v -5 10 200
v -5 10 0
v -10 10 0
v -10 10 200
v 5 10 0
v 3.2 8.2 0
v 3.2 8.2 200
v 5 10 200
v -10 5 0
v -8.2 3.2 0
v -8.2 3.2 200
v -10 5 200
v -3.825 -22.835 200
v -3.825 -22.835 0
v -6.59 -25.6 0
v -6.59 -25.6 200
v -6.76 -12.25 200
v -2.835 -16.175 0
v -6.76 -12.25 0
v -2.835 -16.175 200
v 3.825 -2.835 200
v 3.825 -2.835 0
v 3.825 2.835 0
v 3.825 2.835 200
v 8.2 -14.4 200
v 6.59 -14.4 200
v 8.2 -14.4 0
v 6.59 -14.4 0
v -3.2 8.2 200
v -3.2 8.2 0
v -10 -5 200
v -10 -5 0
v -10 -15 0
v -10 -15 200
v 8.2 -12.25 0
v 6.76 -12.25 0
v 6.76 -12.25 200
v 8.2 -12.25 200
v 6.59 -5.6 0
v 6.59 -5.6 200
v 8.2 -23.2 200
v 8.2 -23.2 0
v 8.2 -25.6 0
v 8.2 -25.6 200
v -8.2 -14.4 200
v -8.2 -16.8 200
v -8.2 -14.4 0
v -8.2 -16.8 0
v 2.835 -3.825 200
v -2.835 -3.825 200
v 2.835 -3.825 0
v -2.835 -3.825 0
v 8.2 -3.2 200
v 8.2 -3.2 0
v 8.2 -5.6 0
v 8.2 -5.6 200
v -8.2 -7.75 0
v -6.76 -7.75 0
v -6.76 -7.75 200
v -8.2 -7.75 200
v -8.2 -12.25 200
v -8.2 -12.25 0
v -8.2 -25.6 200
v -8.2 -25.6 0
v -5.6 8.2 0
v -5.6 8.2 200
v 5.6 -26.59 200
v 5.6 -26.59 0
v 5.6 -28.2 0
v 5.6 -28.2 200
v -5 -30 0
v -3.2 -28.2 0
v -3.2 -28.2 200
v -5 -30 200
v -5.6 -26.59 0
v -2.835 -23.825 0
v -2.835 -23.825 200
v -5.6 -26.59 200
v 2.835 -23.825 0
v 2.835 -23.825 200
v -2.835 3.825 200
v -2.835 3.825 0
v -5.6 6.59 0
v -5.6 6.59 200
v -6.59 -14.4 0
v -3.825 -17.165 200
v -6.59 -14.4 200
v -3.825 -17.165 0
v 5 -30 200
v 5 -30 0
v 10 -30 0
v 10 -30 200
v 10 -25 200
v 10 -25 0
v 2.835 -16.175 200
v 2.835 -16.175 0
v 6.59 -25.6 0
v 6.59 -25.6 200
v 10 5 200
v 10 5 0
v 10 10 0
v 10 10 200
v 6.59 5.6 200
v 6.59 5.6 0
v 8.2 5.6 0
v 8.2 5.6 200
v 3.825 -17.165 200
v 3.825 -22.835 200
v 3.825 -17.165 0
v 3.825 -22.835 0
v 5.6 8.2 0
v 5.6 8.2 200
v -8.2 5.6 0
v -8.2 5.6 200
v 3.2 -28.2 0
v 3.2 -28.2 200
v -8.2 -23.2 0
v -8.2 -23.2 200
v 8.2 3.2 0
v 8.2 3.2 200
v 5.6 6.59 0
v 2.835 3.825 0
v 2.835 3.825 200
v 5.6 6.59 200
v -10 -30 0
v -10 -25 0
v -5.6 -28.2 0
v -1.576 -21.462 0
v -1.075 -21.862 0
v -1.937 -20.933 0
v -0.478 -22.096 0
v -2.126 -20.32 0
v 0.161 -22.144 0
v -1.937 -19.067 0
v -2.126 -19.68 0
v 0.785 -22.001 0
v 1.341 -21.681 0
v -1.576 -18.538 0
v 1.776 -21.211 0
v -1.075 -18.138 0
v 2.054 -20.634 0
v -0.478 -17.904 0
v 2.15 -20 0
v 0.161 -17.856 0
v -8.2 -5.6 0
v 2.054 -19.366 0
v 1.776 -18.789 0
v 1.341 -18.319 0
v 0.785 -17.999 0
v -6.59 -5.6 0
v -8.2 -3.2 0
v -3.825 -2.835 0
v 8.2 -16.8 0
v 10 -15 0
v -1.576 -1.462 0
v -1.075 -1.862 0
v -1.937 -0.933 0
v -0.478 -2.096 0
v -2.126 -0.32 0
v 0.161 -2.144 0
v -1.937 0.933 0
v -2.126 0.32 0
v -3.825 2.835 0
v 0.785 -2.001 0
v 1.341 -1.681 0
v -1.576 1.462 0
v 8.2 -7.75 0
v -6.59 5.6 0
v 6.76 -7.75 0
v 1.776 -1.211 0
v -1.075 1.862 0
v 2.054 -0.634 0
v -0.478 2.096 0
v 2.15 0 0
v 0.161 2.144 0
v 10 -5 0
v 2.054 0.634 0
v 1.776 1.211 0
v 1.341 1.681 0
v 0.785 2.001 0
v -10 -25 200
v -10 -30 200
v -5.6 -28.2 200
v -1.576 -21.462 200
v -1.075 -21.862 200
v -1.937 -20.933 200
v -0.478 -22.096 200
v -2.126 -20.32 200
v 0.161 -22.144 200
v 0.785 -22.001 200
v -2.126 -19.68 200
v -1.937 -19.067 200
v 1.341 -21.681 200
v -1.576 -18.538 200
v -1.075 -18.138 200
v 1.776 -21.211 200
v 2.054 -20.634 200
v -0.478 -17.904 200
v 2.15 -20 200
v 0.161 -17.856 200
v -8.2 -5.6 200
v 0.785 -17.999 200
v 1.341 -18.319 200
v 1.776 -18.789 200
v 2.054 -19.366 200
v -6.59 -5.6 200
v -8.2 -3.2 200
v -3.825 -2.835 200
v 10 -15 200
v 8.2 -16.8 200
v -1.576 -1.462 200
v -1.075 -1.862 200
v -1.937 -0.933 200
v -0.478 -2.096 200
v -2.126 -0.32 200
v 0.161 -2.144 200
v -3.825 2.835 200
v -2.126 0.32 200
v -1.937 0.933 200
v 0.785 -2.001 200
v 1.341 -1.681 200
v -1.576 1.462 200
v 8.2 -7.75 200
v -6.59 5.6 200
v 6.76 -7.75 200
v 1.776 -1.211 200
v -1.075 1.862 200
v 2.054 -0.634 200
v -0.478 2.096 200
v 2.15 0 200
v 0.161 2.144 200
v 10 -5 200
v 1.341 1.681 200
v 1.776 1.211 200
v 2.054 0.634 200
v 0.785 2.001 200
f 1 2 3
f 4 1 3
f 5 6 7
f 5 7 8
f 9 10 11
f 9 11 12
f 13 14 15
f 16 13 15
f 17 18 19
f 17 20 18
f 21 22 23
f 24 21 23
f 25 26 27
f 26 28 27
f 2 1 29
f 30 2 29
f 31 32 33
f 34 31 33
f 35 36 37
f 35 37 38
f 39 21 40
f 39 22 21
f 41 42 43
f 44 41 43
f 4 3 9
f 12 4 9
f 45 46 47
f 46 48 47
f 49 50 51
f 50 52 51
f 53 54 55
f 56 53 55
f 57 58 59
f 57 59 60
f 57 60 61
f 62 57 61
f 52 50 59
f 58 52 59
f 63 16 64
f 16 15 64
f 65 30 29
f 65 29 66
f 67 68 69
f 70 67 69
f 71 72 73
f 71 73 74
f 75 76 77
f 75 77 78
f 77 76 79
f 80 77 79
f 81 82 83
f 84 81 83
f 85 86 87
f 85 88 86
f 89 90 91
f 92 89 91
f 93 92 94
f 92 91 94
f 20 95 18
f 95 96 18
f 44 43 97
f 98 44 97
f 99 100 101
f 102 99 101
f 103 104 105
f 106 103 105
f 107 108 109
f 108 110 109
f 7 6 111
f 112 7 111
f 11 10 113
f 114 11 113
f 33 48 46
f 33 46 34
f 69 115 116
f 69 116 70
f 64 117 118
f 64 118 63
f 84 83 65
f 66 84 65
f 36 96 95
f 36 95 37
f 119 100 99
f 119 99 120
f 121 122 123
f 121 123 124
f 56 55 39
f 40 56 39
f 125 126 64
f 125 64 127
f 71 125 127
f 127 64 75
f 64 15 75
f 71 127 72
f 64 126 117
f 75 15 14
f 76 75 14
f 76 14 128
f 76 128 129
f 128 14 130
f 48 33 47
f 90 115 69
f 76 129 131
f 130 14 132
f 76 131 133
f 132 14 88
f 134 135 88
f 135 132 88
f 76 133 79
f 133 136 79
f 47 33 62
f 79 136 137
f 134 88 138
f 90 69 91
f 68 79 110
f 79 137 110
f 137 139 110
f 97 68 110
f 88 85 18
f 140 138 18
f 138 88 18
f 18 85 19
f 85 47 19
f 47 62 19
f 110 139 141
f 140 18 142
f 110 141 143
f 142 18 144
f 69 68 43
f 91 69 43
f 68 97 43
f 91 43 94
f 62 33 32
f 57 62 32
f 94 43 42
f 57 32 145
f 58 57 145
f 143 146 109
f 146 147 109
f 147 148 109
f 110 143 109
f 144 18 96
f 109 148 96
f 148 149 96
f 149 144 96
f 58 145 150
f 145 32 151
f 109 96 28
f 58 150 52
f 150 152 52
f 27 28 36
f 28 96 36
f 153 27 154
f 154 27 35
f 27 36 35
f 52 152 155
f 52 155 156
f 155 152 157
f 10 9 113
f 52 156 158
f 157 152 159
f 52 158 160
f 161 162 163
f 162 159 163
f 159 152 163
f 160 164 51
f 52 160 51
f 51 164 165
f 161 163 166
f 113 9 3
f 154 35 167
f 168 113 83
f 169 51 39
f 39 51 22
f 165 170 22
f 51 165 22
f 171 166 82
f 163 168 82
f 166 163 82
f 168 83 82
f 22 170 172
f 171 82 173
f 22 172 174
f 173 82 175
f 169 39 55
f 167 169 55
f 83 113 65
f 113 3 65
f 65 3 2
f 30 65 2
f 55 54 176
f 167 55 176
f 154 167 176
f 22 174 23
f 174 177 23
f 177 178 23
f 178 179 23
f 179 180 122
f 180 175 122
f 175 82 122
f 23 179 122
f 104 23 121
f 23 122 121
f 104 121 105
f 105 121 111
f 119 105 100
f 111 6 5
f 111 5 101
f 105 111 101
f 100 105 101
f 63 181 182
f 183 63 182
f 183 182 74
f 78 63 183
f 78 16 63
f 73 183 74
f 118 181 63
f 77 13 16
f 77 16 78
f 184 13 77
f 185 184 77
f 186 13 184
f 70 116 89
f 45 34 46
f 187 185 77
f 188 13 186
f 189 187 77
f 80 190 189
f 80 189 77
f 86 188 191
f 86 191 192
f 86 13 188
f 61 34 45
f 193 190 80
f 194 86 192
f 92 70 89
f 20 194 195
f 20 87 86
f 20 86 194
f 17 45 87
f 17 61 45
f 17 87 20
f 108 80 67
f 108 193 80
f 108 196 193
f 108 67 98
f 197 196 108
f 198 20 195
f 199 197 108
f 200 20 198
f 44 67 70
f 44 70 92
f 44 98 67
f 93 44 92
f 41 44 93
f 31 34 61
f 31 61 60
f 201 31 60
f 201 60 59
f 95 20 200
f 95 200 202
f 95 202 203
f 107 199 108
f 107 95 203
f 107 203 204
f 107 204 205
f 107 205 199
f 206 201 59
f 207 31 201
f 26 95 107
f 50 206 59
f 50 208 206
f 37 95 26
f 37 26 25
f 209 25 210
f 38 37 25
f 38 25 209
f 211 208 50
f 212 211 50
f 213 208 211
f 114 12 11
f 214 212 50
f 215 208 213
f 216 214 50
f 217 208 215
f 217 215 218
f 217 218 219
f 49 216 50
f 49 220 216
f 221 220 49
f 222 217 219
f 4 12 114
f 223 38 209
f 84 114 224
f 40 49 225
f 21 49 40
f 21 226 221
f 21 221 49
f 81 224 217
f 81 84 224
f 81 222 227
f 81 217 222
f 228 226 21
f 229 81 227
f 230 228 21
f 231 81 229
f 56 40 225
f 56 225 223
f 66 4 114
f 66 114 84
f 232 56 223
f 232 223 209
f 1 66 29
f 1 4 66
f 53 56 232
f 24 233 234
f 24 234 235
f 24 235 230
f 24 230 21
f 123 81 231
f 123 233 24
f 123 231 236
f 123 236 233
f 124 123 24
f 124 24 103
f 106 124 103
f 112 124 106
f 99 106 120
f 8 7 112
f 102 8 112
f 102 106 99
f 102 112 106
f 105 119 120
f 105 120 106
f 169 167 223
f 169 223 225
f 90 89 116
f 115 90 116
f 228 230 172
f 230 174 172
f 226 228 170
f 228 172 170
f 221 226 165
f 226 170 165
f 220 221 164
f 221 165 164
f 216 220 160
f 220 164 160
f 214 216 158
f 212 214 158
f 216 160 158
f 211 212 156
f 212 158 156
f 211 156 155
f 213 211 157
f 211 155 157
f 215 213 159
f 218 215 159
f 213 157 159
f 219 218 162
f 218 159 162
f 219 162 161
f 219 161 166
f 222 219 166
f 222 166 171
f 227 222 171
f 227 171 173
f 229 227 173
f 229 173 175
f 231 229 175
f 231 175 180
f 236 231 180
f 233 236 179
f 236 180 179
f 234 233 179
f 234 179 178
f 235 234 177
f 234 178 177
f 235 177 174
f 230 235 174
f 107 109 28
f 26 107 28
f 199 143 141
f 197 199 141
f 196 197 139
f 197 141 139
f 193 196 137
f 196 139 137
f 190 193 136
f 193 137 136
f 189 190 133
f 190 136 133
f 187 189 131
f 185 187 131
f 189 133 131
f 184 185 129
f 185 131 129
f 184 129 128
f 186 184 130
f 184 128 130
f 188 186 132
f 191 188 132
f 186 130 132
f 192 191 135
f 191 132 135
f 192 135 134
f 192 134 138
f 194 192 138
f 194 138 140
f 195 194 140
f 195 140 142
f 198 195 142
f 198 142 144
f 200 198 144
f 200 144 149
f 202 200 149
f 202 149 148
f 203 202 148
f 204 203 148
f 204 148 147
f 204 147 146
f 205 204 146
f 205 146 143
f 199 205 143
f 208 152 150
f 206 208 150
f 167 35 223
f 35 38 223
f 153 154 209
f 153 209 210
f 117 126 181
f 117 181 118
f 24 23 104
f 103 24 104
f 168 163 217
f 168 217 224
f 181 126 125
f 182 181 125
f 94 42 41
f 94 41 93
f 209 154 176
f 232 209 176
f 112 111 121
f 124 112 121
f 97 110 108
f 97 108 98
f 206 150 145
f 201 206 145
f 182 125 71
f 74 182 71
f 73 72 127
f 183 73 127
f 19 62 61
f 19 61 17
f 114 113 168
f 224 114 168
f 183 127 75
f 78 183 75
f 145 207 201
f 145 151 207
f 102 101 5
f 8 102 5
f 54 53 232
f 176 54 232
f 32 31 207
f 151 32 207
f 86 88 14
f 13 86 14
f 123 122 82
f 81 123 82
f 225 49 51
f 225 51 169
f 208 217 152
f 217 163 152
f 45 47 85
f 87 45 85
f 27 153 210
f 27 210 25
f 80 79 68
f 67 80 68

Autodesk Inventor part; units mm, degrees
ref_plane "YZ Plane" through (0, 0, 0) normal (1, 0, 0) x (0, 1, 0)
ref_plane "XZ Plane" through (0, 0, 0) normal (0, 1, 0) x (-1, 0, 0)
ref_plane "XY Plane" through (0, 0, 0) normal (0, 0, 1) x (1, 0, 0)
sketch "Sketch1" plane through (0, 0, 0) normal (0, 0, 1) x (1, 0, 0)
  line L0 (-10, -10) -> (-5.6, -10)
  line L1 (-10, -5.6) -> (-10, -10)
  line L2 (-5.6, -10) -> (-5, -10)
  line L3 (-3.2, -8.2) -> (-5.6, -8.2)
  line L4 (-2.8351, -3.825) -> (-5.6, -6.5899)
  line L5 (-3.825, -2.8351) -> (-6.5899, -5.6)
  line L6 (0, 0) -> (0, -11) construction
  line L7 (0, 0) -> (-12, 0) construction
  line L8 (-3.2, -8.2) -> (-5, -10)
  line L9 (-6.5899, -5.6) -> (-8.2, -5.6)
  line L10 (-10, -5.6) -> (-10, -5)
  line L11 (-10, -5) -> (-8.2, -3.2)
  line L12 (-8.2, -3.2) -> (-8.2, -5.6)
  line L13 (-5.6, -8.2) -> (-5.6, -6.5899)
  arc A0 (-2.15, 0) -> (0, -2.15) centre (0, 0) ccw
  line L14 (0, 0) -> (-3.825, 0)
  line L15 (-3.825, 0) -> (-3.825, -2.8351)
  line L16 (-2.8351, -3.825) -> (0, -3.825)
  line L17 (0, -3.825) -> (0, 0)
  line L18 (-2.8351, -3.825) -> (-3.825, -3.825) construction
  line L19 (-3.825, -3.825) -> (-3.825, -2.8351) construction
  line L20 (3.825, -2.8351) -> (3.825, -3.825) construction
  line L21 (3.825, -2.8351) -> (3.825, 0)
  line L22 (3.825, -3.825) -> (2.8351, -3.825) construction
  line L23 (3.825, 0) -> (0, 0)
  line L24 (0, -3.825) -> (2.8351, -3.825)
  arc A1 (0, -2.15) -> (2.15, 0) centre (0, 0) ccw
  line L25 (0, 0) -> (0, -3.825)
  line L26 (2.8351, -3.825) -> (5.6, -6.5899)
  line L27 (0, 0) -> (0, -12) construction
  line L28 (0, 0) -> (11, 0) construction
  line L29 (3.825, -2.8351) -> (6.5899, -5.6)
  line L30 (8.2, -3.2) -> (8.2, -5.6)
  line L31 (10, -5.6) -> (10, -5)
  line L32 (8.2, -3.2) -> (10, -5)
  line L33 (8.2, -5.6) -> (6.5899, -5.6)
  line L34 (5.6, -6.5899) -> (5.6, -8.2)
  line L35 (10, -10) -> (10, -5.6)
  line L36 (5.6, -10) -> (10, -10)
  line L37 (3.2, -8.2) -> (5.6, -8.2)
  line L38 (5, -10) -> (3.2, -8.2)
  line L39 (5.6, -10) -> (5, -10)
  line L40 (2.8351, 3.825) -> (3.825, 3.825) construction
  line L41 (2.8351, 3.825) -> (0, 3.825)
  line L42 (3.825, 3.825) -> (3.825, 2.8351) construction
  line L43 (0, 3.825) -> (0, 0)
  line L44 (3.825, 0) -> (3.825, 2.8351)
  arc A2 (2.15, 0) -> (0, 2.15) centre (0, 0) ccw
  line L45 (0, 0) -> (3.825, 0)
  line L46 (3.825, 2.8351) -> (6.5899, 5.6)
  line L47 (0, 0) -> (12, 0) construction
  line L48 (0, 0) -> (0, 11) construction
  line L49 (2.8351, 3.825) -> (5.6, 6.5899)
  line L50 (3.2, 8.2) -> (5.6, 8.2)
  line L51 (5.6, 10) -> (5, 10)
  line L52 (3.2, 8.2) -> (5, 10)
  line L53 (5.6, 8.2) -> (5.6, 6.5899)
  line L54 (6.5899, 5.6) -> (8.2, 5.6)
  line L55 (10, 10) -> (5.6, 10)
  line L56 (10, 5.6) -> (10, 10)
  line L57 (8.2, 3.2) -> (8.2, 5.6)
  line L58 (10, 5) -> (8.2, 3.2)
  line L59 (10, 5.6) -> (10, 5)
  line L60 (-3.825, 2.8351) -> (-3.825, 3.825) construction
  line L61 (-3.825, 2.8351) -> (-3.825, 0)
  line L62 (-3.825, 3.825) -> (-2.8351, 3.825) construction
  line L63 (-3.825, 0) -> (0, 0)
  line L64 (0, 3.825) -> (-2.8351, 3.825)
  arc A3 (0, 2.15) -> (-2.15, 0) centre (0, 0) ccw
  line L65 (0, 0) -> (0, 3.825)
  line L66 (-2.8351, 3.825) -> (-5.6, 6.5899)
  line L67 (0, 0) -> (0, 12) construction
  line L68 (0, 0) -> (-11, 0) construction
  line L69 (-3.825, 2.8351) -> (-6.5899, 5.6)
  line L70 (-8.2, 3.2) -> (-8.2, 5.6)
  line L71 (-10, 5.6) -> (-10, 5)
  line L72 (-8.2, 3.2) -> (-10, 5)
  line L73 (-8.2, 5.6) -> (-6.5899, 5.6)
  line L74 (-5.6, 6.5899) -> (-5.6, 8.2)
  line L75 (-10, 10) -> (-10, 5.6)
  line L76 (-5.6, 10) -> (-10, 10)
  line L77 (-3.2, 8.2) -> (-5.6, 8.2)
  line L78 (-5, 10) -> (-3.2, 8.2)
  line L79 (-5.6, 10) -> (-5, 10)
  point P0 (0, 2.15)
  point P1 (2.15, 0)
  point P2 (0, -2.15)
  dimension "d16" = 10
  dimension "d19" = 3.2
  dimension "d21" = 4.4
  dimension "d22" = 4.4
  dimension "d24" = 45
  dimension "d25" = 1.8
  dimension "d27" = 1.8
  dimension "d28" = 45
  dimension "d29" = 3.2
  dimension "d31" = 1.4
  dimension "d33" = 2.15
  dimension "d34" = 3.825
  dimension "d35" = 3.825
  dimension "d36" = 135
  dimension "d39" = 360
extrude "Extrusion1" add sketch "Sketch1" along normal blind 200 contours L1 L10 L11 L12 L9 L5 L15 L14 A0 L17 L16 L4 L13 L3 L8 L2 L0 | L17 A1 L23 L21 L29 L33 L30 L32 L31 L35 L36 L39 L38 L37 L34 L26 L24 | L61 L69 L73 L70 L72 L71 L75 L76 L79 L78 L77 L74 L66 L64 L43 A3 L14 | A2 L43 L41 L49 L53 L50 L52 L51 L55 L56 L59 L58 L57 L54 L46 L44 L23
pattern_linear "Rectangular Pattern1" count 2 spacing 20 along (0, -1, 0) of "Extrusion1"
sketch "Sketch2" plane through (0, 0, 200) normal (0, 0, 1) x (1, 0, 0)
  line L0 (3.2, -8.2) -> (5, -10) projected
  line L1 (-3.2, -11.8) -> (-5, -10) projected
  line L2 (5, -10) -> (-5, -10) construction
  line L3 (-8.2, -12.25) -> (8.2, -12.25)
  line L4 (8.2, -12.25) -> (8.2, -7.75)
  line L5 (8.2, -7.75) -> (-8.2, -7.75)
  line L6 (-8.2, -7.75) -> (-8.2, -12.25)
  line L7 (-8.2, -12.25) -> (8.2, -7.75) construction
  line L8 (8.2, -12.25) -> (-8.2, -7.75) construction
  line L9 (10, -15) -> (10, -5) projected
  line L10 (5.6, -6.5899) -> (5.6, -8.2) projected
  line L11 (5.6, -6.5899) -> (6.7601, -7.75)
  line L12 (-5.6, -6.5899) -> (-2.8351, -3.825) projected
  line L13 (-5.6, -6.5899) -> (-6.7601, -7.75)
  line L14 (5.6, -13.4101) -> (6.7601, -12.25)
  line L15 (-5.6, -13.4101) -> (-6.7601, -12.25)
  line L16 (-5.6, -6.5899) -> (-5.6, -7.75)
  line L17 (-5.6, -8.2) -> (-5.6, -6.5899) projected
  line L18 (5.6, -6.5899) -> (5.6, -7.75)
  line L19 (-5.6, -11.8) -> (-5.6, -13.4101)
  line L20 (5.6, -13.4101) -> (5.6, -12.25)
  point P0 (0, 0)
  point P1 (0, -10)
  point P2 (-5.6, -12.25)
  dimension "d46" = 4.5
  dimension "d50" = 1.8
extrude "Extrusion2" cut sketch "Sketch2" against normal through all
properties part number "AP20x20"
